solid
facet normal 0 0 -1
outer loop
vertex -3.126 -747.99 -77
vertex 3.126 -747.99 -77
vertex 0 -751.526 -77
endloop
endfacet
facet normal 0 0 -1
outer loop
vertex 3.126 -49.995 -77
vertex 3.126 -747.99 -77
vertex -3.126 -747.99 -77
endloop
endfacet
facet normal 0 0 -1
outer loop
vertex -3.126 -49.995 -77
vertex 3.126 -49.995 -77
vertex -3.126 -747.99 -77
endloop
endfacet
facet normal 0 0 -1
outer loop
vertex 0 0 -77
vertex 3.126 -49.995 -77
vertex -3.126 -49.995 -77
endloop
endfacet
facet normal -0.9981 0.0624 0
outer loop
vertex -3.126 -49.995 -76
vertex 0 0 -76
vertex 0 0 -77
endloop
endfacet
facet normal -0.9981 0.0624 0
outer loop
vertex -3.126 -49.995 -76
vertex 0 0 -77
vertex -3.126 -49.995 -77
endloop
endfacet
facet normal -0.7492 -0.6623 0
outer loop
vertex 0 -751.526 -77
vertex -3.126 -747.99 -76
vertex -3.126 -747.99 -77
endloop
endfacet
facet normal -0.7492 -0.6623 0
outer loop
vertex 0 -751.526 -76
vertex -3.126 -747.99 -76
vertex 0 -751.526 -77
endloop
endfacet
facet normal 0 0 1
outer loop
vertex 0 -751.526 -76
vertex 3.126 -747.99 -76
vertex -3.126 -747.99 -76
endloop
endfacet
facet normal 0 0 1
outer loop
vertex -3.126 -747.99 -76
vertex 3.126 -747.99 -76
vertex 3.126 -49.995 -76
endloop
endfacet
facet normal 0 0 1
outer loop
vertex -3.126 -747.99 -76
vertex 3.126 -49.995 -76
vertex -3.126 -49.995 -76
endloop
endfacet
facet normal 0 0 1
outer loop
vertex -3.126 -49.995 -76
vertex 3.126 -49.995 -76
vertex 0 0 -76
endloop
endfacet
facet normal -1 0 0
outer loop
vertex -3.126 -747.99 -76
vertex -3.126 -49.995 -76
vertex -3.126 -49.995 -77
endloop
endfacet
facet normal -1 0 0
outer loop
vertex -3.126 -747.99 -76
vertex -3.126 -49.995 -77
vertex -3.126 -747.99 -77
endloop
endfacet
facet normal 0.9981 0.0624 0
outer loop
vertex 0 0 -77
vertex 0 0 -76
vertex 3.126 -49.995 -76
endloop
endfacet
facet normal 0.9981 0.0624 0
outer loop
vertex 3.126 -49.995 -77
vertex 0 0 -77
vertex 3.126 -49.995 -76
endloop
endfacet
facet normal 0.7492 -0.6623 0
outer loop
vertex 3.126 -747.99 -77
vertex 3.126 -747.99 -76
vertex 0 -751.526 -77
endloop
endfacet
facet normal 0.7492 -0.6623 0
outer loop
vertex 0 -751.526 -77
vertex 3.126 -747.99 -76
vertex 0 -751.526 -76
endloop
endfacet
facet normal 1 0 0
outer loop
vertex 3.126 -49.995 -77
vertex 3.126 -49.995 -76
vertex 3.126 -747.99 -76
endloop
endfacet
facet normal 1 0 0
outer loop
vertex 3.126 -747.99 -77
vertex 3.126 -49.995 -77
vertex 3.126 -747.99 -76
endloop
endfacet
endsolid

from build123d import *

# Parameters (mm, degrees)
F14_DEPTH = 1


with BuildPart() as f14:
    # F13 (on offset) → F14 (new body)
    with BuildSketch(Plane.XY.offset(-76)):
        Polygon((0, -751.526058), (0, 0), (-3.126378, -49.995076), (-3.126378, -747.989655), align=None)
    extrude(amount=-F14_DEPTH)

    # F15: F14 across face


with BuildPart() as f14_1:
    add(f14.part)
    add(f14.part.mirror(Plane(origin=(0, -375.763029, -76.5), x_dir=(0, 1, 0), z_dir=(1, 0, 0))))


solid = f14_1.part
